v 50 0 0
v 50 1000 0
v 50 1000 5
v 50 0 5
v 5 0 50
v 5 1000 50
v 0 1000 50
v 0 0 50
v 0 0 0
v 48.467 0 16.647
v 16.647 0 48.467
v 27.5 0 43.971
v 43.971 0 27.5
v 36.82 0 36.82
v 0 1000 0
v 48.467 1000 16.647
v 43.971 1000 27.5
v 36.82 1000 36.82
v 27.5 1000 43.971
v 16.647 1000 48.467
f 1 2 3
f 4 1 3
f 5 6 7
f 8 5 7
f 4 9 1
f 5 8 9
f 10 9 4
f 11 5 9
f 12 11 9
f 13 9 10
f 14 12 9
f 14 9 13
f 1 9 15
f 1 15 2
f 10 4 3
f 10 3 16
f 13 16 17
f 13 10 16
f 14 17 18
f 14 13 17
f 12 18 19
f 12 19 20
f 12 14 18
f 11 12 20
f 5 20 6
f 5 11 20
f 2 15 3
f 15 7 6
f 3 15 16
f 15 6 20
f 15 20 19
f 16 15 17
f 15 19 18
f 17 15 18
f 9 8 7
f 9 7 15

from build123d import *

# Parameters (mm, degrees)
F1_DEPTH = 1000


with BuildPart() as f1:
    # F0 (on Front) → F1 (new body)
    with BuildSketch(Plane.XZ):
        with BuildLine():
            Line((0, 50), (0, 0))
            Line((0, 0), (50, 0))
            Line((50, 0), (50, 5))
            ThreePointArc((50, 5), (36.819805, 36.819805), (5, 50))
            Line((5, 50), (0, 50))
        make_face()
    extrude(amount=-F1_DEPTH)


solid = f1.part
